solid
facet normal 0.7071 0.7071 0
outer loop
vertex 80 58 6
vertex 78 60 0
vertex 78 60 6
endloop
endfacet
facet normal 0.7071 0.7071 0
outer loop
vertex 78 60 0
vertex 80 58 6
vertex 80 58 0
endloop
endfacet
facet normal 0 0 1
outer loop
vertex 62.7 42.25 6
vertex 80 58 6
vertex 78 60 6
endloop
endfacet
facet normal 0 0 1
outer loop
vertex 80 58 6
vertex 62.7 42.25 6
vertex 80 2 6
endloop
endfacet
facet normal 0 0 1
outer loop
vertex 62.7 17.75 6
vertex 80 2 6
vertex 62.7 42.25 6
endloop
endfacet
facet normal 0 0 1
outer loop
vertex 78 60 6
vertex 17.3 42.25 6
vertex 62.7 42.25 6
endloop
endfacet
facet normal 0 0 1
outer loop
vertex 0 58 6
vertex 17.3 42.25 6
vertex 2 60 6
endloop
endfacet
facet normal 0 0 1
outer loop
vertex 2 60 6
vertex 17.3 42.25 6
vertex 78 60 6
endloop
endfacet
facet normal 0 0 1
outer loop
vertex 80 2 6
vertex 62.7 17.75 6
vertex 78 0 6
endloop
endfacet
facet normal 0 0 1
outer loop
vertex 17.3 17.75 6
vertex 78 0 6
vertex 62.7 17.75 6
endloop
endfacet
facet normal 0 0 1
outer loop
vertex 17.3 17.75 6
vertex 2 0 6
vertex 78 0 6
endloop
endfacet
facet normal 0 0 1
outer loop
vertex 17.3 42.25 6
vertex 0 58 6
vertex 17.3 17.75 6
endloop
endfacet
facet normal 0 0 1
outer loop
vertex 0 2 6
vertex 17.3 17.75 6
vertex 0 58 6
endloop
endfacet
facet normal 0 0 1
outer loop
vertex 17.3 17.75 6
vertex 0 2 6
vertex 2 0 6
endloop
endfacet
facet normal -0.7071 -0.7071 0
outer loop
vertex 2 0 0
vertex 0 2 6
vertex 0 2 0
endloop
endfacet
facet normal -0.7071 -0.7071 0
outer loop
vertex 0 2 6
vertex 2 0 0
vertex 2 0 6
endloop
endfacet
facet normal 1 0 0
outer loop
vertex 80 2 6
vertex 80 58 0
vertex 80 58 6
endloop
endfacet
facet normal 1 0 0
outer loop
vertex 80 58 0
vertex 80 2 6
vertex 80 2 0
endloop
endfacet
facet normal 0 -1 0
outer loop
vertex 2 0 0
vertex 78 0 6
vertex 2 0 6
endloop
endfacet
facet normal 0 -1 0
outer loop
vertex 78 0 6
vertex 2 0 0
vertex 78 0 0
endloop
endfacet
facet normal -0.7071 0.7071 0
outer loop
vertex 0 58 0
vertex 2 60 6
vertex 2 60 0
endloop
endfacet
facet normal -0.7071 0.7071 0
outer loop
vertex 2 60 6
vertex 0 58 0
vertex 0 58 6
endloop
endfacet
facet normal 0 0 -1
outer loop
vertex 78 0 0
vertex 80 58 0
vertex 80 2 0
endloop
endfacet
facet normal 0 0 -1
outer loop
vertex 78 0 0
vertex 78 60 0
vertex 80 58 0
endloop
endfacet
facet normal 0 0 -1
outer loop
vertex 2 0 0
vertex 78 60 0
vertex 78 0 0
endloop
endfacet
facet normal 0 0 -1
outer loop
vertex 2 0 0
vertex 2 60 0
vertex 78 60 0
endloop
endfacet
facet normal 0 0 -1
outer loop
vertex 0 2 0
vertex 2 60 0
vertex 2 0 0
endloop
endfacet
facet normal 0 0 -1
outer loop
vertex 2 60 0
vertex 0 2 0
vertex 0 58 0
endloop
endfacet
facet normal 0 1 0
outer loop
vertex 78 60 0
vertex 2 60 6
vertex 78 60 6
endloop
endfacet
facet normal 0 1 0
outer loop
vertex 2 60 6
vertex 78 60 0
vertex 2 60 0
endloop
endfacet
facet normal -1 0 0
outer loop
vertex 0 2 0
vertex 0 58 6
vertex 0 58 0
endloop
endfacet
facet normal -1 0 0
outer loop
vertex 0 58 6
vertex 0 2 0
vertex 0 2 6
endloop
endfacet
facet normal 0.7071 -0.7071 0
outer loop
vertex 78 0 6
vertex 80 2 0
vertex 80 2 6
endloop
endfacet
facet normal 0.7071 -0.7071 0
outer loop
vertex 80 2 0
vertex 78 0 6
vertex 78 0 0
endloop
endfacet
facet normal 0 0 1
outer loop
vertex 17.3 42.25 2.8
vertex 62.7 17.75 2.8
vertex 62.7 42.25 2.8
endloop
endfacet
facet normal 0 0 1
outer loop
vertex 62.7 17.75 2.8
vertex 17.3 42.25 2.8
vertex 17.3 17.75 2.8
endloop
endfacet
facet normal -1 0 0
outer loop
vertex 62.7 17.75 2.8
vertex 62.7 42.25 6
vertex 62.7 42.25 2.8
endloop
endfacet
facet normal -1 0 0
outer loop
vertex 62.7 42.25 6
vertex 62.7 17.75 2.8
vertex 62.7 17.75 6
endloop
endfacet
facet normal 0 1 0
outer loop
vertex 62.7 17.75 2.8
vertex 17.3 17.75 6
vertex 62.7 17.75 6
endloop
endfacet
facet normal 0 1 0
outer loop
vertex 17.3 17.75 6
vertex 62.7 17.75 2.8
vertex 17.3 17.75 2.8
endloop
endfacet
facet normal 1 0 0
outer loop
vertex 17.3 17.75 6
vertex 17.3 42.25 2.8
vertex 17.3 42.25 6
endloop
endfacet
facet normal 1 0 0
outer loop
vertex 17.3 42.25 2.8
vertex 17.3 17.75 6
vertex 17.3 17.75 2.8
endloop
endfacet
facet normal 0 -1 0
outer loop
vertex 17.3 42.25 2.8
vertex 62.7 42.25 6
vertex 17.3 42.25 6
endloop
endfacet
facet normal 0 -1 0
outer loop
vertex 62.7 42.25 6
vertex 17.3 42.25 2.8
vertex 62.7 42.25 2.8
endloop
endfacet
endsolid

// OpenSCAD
$fn = 32;

// ----------------------------------------------------------------------
// Windowed plate: 1 voids, 80 x 60 x 6 mm
// ----------------------------------------------------------------------

// --- parameters (mm) ---
plate_l = 80;             // plate length, X
plate_w = 60;             // plate width, Y
plate_t = 6;              // plate thickness, Z
edge_margin = 12;         // wall from the plate edge to any window
win1_l = 45.4;            // window length
win1_w = 24.5;            // window width
depth_1 = 3.2;            // depth of void 1 (full thickness = through)
corner_c = 2;             // corner chamfer of the plate

profile = [[2, 0], [78, 0], [80, 2], [80, 58], [78, 60], [2, 60], [0, 58], [0, 2]];  // primary outline, 8 points, counter clockwise
void_1 = [[17.3, 17.75], [62.7, 17.75], [62.7, 42.25], [17.3, 42.25]];  // large central window, 4 points

// --- the one profile operation ---
difference() {
  linear_extrude(height = plate_t) polygon(points = profile);
  translate([0, 0, plate_t - depth_1])
    linear_extrude(height = depth_1 + 1) polygon(points = void_1);
}
